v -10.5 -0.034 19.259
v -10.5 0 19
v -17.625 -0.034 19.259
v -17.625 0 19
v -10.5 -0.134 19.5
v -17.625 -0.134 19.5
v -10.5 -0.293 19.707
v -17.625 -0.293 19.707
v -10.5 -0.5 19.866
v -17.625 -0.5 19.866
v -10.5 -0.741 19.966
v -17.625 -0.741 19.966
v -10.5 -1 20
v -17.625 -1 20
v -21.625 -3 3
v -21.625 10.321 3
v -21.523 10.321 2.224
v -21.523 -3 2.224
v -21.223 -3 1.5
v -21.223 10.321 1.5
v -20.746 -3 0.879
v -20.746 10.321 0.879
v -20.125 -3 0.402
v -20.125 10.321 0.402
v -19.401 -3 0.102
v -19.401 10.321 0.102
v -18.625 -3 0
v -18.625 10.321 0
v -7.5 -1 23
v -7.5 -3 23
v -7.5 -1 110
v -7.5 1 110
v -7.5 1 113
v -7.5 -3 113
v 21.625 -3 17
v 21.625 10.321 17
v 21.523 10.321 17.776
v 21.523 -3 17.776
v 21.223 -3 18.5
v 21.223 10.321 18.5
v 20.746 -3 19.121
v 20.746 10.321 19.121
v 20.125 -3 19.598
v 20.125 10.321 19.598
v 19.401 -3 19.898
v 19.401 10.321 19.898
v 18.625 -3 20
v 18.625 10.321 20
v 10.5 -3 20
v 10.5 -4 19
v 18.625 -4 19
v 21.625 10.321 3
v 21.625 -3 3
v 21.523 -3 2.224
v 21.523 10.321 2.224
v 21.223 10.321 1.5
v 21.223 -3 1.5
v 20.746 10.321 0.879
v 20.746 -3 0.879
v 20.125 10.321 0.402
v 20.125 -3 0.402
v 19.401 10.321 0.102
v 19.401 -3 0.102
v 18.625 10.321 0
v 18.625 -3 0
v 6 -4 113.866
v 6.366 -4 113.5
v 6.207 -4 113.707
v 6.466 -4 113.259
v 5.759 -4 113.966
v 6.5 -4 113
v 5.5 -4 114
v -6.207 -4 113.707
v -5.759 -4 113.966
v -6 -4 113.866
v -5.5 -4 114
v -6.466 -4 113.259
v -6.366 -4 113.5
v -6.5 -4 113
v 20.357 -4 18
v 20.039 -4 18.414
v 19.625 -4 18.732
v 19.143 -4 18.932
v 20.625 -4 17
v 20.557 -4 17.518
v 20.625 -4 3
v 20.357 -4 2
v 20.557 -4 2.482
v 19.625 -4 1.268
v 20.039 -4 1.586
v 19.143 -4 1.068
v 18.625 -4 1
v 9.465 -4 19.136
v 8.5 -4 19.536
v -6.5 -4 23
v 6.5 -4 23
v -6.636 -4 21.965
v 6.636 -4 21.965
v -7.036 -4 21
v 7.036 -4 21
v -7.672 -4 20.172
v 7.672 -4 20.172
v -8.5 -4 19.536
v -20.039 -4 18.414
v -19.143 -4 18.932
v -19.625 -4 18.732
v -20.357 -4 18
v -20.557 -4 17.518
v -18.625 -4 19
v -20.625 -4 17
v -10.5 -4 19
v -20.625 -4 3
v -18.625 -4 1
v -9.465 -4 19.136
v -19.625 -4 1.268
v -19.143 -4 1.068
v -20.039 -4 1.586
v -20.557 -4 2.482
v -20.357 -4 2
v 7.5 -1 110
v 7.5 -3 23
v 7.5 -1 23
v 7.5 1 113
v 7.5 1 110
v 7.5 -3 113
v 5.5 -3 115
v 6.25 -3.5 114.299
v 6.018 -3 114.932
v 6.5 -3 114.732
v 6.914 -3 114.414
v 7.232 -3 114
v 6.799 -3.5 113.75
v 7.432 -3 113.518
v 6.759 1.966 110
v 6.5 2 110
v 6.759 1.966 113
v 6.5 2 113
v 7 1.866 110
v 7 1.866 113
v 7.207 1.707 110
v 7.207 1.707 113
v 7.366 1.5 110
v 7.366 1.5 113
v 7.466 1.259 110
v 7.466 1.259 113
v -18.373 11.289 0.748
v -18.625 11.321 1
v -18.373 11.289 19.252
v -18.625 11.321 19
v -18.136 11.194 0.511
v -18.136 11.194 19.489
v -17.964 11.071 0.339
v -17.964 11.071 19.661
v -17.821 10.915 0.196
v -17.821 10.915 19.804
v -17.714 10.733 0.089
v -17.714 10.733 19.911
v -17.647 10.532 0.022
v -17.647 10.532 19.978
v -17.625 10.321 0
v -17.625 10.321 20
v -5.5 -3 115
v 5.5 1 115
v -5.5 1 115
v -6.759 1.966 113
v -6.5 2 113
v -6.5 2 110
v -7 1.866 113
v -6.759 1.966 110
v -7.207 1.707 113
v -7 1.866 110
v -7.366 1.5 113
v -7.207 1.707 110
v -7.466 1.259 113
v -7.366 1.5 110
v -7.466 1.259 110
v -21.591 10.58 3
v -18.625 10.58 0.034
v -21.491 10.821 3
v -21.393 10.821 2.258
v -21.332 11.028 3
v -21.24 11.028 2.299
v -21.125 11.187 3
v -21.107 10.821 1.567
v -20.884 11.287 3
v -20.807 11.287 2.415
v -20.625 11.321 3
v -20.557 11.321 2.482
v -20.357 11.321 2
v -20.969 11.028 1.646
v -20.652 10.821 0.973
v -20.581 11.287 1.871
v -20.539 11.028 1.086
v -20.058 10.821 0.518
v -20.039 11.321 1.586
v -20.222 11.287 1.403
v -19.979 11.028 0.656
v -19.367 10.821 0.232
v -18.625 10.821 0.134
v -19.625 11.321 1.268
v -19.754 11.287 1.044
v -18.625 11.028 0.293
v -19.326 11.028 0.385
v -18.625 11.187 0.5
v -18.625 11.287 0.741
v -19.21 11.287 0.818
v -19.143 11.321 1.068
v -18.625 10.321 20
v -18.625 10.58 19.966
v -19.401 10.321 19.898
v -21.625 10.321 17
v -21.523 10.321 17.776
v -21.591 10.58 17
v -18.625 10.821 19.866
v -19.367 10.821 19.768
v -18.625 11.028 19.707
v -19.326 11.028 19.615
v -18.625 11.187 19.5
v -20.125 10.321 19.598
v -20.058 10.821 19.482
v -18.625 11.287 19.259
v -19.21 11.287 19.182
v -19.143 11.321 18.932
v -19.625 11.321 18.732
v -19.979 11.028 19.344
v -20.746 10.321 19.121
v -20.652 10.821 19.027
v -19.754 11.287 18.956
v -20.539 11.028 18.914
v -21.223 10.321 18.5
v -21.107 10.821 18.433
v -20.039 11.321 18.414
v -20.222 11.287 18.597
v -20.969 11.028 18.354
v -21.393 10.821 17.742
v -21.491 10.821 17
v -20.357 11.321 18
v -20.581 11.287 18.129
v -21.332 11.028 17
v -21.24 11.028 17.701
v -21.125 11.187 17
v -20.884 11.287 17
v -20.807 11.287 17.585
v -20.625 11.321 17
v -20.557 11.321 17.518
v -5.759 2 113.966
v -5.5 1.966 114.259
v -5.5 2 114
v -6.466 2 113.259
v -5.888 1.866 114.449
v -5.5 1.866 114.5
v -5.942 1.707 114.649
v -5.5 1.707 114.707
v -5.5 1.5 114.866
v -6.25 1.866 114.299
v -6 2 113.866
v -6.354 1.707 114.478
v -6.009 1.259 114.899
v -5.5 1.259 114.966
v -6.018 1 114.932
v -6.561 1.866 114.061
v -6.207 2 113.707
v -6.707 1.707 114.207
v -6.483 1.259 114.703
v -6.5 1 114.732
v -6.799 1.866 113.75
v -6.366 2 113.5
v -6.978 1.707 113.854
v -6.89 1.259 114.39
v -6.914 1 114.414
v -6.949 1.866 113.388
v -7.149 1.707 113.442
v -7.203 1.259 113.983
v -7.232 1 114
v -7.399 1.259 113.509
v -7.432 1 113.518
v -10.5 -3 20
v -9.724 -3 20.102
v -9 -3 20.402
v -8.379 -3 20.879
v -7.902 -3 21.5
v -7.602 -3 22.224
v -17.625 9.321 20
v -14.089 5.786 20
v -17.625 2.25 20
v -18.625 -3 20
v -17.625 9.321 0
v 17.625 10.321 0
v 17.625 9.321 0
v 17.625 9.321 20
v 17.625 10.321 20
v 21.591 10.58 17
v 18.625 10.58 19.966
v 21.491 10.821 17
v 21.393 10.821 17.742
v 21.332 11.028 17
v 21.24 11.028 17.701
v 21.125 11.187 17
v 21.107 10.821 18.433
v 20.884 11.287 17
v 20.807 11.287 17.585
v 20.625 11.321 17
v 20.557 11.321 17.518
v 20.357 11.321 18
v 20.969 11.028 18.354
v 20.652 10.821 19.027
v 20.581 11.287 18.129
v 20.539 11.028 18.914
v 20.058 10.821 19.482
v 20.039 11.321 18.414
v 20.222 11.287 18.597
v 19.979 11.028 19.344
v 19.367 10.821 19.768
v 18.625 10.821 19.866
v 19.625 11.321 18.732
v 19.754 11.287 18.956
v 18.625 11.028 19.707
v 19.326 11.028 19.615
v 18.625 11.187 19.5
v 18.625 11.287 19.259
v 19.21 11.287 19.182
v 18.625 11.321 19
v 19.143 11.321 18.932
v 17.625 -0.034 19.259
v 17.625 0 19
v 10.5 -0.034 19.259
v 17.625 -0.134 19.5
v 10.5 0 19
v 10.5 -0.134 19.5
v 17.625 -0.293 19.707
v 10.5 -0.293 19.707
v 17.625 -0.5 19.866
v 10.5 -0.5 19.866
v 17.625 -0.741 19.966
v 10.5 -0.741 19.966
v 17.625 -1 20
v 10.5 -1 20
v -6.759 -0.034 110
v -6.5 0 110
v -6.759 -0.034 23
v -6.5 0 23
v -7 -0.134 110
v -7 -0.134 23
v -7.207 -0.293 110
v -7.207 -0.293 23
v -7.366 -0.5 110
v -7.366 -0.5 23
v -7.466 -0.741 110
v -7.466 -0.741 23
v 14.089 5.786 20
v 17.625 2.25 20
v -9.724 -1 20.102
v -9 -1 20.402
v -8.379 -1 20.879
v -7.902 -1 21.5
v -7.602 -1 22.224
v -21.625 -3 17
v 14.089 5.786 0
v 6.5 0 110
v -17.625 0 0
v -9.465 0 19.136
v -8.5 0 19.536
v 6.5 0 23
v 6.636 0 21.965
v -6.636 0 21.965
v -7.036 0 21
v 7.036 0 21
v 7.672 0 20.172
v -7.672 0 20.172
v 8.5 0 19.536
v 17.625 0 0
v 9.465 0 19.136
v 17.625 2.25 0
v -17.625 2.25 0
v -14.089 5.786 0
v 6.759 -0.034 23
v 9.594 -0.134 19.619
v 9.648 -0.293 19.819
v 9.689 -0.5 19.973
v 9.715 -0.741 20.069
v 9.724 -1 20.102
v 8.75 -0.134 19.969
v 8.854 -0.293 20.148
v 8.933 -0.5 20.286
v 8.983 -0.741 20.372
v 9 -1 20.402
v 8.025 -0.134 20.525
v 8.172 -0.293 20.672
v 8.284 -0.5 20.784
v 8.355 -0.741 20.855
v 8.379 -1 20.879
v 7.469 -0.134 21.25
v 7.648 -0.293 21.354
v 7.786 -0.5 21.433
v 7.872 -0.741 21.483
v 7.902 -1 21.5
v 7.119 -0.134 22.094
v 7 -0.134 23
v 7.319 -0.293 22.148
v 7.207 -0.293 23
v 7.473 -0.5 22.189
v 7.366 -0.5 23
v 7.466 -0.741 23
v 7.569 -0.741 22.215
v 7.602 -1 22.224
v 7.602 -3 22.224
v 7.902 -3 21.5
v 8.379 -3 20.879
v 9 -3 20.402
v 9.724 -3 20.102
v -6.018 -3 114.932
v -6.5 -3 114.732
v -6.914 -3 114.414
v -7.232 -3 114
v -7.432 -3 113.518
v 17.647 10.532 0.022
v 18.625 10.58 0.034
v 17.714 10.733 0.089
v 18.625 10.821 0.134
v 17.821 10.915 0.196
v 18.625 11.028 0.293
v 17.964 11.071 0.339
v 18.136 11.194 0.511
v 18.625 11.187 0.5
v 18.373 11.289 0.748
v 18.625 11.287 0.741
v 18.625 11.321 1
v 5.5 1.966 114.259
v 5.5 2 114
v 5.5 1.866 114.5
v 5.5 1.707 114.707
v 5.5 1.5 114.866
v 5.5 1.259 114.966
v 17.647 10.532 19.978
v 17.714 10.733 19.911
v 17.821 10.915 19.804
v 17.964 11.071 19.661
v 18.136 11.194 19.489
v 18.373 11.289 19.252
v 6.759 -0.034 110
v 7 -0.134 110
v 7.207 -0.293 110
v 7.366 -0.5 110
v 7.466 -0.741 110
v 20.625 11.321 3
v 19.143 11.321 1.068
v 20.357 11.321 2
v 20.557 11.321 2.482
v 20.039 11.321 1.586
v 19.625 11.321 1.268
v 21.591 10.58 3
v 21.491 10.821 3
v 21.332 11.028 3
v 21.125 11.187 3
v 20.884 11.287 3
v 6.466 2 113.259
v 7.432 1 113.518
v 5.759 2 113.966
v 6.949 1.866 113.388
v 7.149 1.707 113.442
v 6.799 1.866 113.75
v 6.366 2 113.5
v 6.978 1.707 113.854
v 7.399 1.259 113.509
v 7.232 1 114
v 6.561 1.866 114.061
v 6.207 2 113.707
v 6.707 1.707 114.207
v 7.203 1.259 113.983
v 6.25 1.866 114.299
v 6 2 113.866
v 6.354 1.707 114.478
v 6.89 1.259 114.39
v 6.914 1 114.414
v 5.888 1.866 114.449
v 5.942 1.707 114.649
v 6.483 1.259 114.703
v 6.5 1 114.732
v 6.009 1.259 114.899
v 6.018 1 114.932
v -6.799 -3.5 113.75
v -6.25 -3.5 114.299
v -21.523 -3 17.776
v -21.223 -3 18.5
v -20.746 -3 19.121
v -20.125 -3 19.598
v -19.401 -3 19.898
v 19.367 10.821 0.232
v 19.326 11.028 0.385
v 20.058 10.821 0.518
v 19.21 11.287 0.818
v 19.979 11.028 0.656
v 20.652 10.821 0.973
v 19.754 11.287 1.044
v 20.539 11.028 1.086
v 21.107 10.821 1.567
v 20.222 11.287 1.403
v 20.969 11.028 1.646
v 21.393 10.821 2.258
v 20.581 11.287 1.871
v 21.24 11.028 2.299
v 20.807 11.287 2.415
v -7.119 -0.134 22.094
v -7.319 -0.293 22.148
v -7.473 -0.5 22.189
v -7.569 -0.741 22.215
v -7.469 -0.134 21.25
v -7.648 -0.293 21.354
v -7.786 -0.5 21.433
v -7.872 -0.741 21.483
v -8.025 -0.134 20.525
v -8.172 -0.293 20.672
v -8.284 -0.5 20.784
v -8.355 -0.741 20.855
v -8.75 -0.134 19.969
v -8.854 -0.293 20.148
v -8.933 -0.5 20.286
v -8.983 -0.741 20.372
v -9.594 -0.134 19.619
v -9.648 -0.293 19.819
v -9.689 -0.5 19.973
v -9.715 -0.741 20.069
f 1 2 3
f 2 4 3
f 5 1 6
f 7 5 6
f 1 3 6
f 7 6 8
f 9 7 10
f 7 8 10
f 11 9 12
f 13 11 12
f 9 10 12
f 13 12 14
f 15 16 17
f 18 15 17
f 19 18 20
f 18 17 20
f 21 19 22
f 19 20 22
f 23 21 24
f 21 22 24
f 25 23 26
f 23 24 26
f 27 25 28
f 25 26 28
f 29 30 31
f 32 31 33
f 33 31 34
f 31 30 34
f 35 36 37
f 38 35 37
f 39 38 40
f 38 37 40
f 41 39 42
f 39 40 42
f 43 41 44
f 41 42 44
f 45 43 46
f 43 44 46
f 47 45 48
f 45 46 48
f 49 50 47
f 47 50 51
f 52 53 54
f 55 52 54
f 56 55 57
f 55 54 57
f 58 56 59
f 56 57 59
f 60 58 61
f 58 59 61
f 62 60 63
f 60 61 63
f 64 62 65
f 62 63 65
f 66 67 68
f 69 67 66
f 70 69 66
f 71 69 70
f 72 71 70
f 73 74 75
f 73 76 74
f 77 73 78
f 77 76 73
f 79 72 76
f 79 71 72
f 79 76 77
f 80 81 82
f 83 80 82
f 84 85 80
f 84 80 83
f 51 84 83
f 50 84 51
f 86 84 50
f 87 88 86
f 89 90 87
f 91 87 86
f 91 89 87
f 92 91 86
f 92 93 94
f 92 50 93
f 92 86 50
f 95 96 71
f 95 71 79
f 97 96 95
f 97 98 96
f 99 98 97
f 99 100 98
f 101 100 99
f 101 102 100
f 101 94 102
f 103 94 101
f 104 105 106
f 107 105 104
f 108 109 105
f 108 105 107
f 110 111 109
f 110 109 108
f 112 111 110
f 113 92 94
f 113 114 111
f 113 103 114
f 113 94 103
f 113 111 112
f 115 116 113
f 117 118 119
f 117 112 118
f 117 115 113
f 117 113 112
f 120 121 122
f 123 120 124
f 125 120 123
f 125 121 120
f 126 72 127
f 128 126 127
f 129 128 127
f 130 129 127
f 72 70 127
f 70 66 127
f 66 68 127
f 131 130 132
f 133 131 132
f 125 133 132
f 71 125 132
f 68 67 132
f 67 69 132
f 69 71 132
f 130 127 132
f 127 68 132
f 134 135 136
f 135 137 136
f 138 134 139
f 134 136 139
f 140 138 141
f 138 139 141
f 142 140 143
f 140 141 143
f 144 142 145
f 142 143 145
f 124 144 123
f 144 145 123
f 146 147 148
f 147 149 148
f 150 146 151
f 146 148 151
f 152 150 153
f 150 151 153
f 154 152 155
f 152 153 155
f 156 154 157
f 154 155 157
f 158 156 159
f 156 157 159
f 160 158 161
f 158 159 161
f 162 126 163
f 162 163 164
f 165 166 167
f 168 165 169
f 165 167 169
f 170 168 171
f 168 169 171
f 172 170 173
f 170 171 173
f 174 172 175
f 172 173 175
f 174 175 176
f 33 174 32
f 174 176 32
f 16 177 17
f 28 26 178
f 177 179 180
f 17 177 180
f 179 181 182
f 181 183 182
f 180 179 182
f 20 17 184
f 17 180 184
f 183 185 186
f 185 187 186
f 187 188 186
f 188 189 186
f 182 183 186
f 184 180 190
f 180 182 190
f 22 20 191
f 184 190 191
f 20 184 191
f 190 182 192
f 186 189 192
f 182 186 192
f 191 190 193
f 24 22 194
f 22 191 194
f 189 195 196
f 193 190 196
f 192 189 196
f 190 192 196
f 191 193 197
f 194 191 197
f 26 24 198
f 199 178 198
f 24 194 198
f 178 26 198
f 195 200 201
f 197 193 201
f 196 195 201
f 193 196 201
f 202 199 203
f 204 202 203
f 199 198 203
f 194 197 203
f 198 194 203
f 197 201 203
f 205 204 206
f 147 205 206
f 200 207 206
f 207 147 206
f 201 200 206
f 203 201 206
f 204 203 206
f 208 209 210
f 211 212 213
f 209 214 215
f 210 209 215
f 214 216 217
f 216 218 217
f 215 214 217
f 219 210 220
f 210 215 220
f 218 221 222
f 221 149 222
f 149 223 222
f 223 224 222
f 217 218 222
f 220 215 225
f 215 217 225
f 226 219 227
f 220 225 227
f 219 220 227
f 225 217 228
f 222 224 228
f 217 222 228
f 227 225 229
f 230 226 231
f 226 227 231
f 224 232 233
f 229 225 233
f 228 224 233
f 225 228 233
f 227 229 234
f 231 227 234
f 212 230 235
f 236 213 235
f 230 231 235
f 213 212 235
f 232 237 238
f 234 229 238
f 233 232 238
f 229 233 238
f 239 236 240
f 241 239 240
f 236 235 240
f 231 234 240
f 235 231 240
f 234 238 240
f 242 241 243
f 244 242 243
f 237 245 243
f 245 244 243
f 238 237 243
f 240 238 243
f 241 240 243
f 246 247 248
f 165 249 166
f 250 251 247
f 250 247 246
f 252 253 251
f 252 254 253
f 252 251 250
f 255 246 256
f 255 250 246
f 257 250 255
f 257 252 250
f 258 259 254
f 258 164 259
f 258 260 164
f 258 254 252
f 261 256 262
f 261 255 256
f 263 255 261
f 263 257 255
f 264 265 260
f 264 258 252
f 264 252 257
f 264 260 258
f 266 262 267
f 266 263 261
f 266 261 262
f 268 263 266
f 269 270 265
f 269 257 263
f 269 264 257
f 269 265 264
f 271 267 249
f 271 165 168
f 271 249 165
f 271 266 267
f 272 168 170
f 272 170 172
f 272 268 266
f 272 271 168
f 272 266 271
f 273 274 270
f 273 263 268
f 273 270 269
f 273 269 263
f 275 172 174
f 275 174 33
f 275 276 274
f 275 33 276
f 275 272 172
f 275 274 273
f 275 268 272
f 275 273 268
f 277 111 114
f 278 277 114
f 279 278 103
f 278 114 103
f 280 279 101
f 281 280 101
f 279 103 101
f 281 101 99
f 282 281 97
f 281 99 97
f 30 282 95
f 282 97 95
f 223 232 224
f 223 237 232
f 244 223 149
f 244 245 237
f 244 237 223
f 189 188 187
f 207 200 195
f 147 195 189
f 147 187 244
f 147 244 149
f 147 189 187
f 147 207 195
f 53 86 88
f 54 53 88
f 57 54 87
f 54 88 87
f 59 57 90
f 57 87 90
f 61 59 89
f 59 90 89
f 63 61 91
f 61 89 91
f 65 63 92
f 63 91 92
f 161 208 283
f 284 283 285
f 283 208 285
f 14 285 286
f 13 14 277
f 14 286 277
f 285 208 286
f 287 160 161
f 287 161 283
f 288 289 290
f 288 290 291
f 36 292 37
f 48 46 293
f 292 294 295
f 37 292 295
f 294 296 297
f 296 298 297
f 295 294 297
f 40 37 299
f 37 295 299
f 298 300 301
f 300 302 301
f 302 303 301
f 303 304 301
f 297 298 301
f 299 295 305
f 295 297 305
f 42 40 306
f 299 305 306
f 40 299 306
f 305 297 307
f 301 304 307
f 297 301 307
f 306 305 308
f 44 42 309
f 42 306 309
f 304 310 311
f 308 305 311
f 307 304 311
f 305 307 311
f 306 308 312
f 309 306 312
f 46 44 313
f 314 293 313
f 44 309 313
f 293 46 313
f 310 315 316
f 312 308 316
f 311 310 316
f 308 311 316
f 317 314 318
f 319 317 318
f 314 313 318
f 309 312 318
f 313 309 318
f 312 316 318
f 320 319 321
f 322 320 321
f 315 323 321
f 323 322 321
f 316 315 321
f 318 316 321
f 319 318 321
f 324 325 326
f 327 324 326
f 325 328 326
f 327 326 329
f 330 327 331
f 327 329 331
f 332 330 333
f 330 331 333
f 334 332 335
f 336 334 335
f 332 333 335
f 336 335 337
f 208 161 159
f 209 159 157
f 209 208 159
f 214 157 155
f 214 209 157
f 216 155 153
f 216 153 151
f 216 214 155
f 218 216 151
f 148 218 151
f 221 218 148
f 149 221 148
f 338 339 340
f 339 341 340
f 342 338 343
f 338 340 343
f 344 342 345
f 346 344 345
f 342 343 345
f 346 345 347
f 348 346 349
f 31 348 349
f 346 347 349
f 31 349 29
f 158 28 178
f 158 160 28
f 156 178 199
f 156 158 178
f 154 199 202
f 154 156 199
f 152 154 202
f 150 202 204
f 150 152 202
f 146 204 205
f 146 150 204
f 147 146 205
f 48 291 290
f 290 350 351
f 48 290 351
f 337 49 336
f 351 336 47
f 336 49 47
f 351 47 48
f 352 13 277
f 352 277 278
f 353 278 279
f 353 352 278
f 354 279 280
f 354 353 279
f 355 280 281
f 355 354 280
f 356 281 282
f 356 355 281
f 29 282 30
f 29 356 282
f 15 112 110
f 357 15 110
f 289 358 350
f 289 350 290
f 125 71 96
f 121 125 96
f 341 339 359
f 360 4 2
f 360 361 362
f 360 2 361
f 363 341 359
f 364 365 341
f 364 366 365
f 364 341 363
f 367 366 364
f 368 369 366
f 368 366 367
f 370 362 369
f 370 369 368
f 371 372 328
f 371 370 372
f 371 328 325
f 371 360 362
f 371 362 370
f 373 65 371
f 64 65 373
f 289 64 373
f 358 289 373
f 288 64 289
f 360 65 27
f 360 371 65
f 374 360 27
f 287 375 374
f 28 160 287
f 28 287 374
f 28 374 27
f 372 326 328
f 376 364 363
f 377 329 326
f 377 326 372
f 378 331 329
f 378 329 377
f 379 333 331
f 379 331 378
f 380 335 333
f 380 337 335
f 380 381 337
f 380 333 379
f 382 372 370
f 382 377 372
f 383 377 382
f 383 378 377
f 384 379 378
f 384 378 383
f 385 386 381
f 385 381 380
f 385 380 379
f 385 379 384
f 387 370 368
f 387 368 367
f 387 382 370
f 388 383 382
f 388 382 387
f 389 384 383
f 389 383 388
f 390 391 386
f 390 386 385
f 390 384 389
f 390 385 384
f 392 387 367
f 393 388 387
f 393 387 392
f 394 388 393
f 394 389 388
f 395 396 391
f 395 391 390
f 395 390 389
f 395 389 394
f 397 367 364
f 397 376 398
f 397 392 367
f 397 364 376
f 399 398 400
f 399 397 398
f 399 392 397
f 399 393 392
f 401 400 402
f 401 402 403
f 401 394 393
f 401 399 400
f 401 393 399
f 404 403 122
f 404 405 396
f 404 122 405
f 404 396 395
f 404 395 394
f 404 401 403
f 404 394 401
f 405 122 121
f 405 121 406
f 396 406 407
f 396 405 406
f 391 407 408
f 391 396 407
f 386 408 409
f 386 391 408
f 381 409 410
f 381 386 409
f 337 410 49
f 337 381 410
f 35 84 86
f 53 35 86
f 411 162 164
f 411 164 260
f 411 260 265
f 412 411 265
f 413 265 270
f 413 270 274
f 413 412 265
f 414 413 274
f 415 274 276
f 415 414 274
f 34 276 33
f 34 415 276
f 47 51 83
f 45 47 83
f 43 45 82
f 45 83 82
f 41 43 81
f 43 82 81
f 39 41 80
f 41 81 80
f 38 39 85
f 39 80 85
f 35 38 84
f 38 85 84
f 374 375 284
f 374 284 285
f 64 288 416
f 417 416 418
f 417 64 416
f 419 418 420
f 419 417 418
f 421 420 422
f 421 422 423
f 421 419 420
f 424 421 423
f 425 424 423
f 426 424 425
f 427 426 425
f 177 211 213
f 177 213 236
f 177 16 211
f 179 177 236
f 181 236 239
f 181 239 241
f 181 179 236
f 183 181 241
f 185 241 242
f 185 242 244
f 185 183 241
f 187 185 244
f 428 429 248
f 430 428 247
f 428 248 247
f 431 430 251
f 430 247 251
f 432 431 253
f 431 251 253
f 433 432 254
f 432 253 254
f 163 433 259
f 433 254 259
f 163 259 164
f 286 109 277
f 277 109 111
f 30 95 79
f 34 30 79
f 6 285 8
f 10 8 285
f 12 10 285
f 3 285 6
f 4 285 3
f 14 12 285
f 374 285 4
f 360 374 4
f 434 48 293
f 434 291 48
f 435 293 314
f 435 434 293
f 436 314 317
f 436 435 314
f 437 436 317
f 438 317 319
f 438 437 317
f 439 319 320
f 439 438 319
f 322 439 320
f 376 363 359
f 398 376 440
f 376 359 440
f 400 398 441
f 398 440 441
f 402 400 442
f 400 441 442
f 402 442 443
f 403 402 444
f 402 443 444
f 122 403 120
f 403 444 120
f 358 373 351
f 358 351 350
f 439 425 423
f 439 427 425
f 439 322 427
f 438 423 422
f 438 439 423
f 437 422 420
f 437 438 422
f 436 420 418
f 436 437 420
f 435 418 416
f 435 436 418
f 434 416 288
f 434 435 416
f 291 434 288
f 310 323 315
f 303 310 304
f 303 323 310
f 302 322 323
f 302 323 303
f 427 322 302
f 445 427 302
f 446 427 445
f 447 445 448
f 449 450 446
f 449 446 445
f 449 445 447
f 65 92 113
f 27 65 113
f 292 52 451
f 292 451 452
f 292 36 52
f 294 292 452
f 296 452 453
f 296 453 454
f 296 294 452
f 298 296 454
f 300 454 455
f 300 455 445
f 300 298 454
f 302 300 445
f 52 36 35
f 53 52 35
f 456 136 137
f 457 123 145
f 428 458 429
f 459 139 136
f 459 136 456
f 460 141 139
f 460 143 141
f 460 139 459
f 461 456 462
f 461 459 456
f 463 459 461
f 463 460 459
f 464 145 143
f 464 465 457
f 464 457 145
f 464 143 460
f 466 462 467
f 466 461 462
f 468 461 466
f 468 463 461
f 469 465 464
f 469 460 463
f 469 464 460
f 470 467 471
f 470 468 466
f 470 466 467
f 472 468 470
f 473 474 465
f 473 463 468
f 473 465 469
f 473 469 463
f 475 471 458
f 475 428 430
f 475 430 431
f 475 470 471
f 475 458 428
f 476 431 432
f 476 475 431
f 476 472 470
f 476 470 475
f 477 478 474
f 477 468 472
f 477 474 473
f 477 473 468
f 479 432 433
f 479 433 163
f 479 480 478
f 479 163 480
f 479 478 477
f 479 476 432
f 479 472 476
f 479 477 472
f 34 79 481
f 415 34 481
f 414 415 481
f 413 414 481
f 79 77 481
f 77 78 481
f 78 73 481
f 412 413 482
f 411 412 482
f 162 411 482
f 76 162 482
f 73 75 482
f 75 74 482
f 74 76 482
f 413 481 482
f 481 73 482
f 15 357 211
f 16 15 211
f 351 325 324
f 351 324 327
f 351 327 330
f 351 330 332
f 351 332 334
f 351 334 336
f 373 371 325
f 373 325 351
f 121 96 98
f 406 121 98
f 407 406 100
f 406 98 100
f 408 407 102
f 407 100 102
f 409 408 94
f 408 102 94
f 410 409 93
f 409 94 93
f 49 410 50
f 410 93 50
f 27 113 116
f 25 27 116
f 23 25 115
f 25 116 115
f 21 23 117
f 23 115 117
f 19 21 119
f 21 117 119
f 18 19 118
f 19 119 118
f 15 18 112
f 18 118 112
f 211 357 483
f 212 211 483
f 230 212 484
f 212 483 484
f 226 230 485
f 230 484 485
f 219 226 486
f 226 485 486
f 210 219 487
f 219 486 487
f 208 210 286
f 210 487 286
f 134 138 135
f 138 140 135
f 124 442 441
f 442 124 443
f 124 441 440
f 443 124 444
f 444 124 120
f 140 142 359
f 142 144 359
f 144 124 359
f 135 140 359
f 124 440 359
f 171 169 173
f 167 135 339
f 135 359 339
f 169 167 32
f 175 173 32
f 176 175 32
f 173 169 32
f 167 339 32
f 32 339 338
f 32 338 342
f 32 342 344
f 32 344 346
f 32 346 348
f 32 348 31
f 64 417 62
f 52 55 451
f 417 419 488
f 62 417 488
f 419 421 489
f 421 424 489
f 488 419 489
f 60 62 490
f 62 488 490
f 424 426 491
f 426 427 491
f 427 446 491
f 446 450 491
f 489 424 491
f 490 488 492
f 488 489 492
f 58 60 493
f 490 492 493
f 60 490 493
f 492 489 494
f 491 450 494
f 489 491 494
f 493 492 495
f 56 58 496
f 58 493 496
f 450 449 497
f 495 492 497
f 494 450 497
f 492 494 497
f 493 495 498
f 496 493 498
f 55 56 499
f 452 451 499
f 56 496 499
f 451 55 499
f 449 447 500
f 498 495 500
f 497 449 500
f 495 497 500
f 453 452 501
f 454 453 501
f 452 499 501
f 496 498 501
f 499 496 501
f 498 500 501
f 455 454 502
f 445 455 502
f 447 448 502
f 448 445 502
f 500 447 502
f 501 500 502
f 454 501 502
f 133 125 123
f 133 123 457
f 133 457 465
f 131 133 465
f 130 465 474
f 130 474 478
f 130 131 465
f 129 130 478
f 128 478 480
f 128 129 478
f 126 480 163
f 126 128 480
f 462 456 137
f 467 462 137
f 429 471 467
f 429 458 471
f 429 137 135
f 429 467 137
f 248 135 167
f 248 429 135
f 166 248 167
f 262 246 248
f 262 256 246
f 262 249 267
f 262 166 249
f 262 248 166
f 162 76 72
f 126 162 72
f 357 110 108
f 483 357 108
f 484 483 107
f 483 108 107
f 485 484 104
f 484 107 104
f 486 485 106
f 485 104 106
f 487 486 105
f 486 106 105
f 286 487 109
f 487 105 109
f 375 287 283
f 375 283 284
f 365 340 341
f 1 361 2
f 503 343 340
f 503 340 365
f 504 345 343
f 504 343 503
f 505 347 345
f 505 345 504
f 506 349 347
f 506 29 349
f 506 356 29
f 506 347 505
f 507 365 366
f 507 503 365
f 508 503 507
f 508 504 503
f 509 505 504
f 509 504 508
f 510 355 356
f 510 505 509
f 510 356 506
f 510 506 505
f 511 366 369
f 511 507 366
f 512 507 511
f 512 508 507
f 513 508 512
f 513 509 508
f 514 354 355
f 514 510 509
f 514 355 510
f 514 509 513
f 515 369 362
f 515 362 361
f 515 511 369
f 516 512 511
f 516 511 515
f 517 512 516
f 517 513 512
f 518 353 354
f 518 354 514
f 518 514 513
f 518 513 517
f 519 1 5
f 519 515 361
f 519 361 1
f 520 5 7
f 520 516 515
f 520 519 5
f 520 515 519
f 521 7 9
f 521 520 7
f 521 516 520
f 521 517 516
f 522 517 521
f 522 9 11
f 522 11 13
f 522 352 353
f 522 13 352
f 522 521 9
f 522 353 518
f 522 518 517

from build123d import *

# Parameters (mm, degrees)
PAD_DEPTH    = 115
POCKET_DEPTH = 15.322068
SKETCH002_W  = 15
SKETCH002_H  = 5
PAD001_DEPTH = 2
FILLET_R     = 3
FILLET001_R  = 2
CHAMFER_SIZE = 1
FILLET002_R  = 1
FILLET003_R  = 1
FILLET004_R  = 1
FILLET005_R  = 1


with BuildPart() as part:
    # Sketch → Pad (new body)
    with BuildSketch(Plane.XY):
        Polygon((-17.625, 0), (17.625, 0), (17.625, 2.25), (14.089466, 5.785534), (17.625, 9.321068), (17.625, 11.321068), (21.625, 11.321068), (21.625, -4), (-21.625, -4), (-21.625, 11.321068), (-17.625, 11.321068), (-17.625, 9.321068), (-14.089466, 5.785534), (-17.625, 2.25), align=None)
    extrude(amount=PAD_DEPTH)

    # Sketch001 (on Face8 of Pad) → Pocket (cut, through all)
    with BuildSketch(Plane.XZ.offset(4)):
        Polygon((7.5, 130), (7.5, 20), (48.935, 20), (48.935, 139.08), (-48.935, 139.08), (-48.935, 20), (-7.5, 20), (-7.5, 130), align=None)
    extrude(amount=-POCKET_DEPTH, mode=Mode.SUBTRACT)

    # Sketch002 (on Face1 of Pocket) → Pad001 (join)
    with BuildSketch(Plane(origin=(0, 0, 0), x_dir=(-1, 0, 0), z_dir=(0, 1, 0))):
        with Locations((0, 112.5)):
            Rectangle(SKETCH002_W, SKETCH002_H)
    extrude(amount=PAD001_DEPTH)

    # Fillet
    fillet_edges = [part.edges().sort_by_distance(p)[0] for p in [
        (21.625, 3.660534, 20),
        (21.625, 3.660534, 0),
        (-21.625, 3.660534, 0),
        (-21.625, 3.660534, 20),
        (-7.5, -2, 20),
        (7.5, -2, 20),
    ]]
    fillet(fillet_edges, radius=FILLET_R)

    # Fillet001
    fillet001_edges = [part.edges().sort_by_distance(p)[0] for p in [
        (-7.5, -2, 115),
        (7.5, -2, 115),
    ]]
    fillet(fillet001_edges, radius=FILLET001_R)

    # Chamfer
    chamfer_edges = [part.edges().sort_by_distance(p)[0] for p in [
        (7.5, -4, 68),
        (6.914214, -4, 114.414214),
        (8.37868, -4, 20.87868),
        (0, -4, 115),
        (14.5625, -4, 20),
        (-6.914214, -4, 114.414214),
        (20.74632, -4, 19.12132),
        (-7.5, -4, 68),
        (21.625, -4, 10),
        (-8.37868, -4, 20.87868),
        (20.74632, -4, 0.87868),
        (-14.5625, -4, 20),
        (0, -4, 0),
        (-20.74632, -4, 19.12132),
        (-20.74632, -4, 0.87868),
        (-21.625, -4, 10),
    ]]
    chamfer(chamfer_edges, length=CHAMFER_SIZE)

    # Fillet002
    fillet002_edges = [part.edges().sort_by_distance(p)[0] for p in [
        (0, 2, 115),
    ]]
    fillet(fillet002_edges, radius=FILLET002_R)

    # Fillet003
    fillet003_edges = [part.edges().sort_by_distance(p)[0] for p in [
        (-18.125, 11.321068, 0),
        (-20.74632, 11.321068, 0.87868),
        (-17.625, 11.321068, 10),
        (-21.625, 11.321068, 10),
        (-18.125, 11.321068, 20),
        (-20.74632, 11.321068, 19.12132),
        (18.125, 11.321068, 0),
        (20.74632, 11.321068, 0.87868),
        (17.625, 11.321068, 10),
        (21.625, 11.321068, 10),
        (18.125, 11.321068, 20),
        (20.74632, 11.321068, 19.12132),
    ]]
    fillet(fillet003_edges, radius=FILLET003_R)

    # Fillet004
    fillet004_edges = [part.edges().sort_by_distance(p)[0] for p in [
        (-7.5, 0, 66.5),
    ]]
    fillet(fillet004_edges, radius=FILLET004_R)

    # Fillet005
    fillet005_edges = [part.edges().sort_by_distance(p)[0] for p in [
        (7.5, 0, 66.5),
    ]]
    fillet(fillet005_edges, radius=FILLET005_R)


solid = part.part
